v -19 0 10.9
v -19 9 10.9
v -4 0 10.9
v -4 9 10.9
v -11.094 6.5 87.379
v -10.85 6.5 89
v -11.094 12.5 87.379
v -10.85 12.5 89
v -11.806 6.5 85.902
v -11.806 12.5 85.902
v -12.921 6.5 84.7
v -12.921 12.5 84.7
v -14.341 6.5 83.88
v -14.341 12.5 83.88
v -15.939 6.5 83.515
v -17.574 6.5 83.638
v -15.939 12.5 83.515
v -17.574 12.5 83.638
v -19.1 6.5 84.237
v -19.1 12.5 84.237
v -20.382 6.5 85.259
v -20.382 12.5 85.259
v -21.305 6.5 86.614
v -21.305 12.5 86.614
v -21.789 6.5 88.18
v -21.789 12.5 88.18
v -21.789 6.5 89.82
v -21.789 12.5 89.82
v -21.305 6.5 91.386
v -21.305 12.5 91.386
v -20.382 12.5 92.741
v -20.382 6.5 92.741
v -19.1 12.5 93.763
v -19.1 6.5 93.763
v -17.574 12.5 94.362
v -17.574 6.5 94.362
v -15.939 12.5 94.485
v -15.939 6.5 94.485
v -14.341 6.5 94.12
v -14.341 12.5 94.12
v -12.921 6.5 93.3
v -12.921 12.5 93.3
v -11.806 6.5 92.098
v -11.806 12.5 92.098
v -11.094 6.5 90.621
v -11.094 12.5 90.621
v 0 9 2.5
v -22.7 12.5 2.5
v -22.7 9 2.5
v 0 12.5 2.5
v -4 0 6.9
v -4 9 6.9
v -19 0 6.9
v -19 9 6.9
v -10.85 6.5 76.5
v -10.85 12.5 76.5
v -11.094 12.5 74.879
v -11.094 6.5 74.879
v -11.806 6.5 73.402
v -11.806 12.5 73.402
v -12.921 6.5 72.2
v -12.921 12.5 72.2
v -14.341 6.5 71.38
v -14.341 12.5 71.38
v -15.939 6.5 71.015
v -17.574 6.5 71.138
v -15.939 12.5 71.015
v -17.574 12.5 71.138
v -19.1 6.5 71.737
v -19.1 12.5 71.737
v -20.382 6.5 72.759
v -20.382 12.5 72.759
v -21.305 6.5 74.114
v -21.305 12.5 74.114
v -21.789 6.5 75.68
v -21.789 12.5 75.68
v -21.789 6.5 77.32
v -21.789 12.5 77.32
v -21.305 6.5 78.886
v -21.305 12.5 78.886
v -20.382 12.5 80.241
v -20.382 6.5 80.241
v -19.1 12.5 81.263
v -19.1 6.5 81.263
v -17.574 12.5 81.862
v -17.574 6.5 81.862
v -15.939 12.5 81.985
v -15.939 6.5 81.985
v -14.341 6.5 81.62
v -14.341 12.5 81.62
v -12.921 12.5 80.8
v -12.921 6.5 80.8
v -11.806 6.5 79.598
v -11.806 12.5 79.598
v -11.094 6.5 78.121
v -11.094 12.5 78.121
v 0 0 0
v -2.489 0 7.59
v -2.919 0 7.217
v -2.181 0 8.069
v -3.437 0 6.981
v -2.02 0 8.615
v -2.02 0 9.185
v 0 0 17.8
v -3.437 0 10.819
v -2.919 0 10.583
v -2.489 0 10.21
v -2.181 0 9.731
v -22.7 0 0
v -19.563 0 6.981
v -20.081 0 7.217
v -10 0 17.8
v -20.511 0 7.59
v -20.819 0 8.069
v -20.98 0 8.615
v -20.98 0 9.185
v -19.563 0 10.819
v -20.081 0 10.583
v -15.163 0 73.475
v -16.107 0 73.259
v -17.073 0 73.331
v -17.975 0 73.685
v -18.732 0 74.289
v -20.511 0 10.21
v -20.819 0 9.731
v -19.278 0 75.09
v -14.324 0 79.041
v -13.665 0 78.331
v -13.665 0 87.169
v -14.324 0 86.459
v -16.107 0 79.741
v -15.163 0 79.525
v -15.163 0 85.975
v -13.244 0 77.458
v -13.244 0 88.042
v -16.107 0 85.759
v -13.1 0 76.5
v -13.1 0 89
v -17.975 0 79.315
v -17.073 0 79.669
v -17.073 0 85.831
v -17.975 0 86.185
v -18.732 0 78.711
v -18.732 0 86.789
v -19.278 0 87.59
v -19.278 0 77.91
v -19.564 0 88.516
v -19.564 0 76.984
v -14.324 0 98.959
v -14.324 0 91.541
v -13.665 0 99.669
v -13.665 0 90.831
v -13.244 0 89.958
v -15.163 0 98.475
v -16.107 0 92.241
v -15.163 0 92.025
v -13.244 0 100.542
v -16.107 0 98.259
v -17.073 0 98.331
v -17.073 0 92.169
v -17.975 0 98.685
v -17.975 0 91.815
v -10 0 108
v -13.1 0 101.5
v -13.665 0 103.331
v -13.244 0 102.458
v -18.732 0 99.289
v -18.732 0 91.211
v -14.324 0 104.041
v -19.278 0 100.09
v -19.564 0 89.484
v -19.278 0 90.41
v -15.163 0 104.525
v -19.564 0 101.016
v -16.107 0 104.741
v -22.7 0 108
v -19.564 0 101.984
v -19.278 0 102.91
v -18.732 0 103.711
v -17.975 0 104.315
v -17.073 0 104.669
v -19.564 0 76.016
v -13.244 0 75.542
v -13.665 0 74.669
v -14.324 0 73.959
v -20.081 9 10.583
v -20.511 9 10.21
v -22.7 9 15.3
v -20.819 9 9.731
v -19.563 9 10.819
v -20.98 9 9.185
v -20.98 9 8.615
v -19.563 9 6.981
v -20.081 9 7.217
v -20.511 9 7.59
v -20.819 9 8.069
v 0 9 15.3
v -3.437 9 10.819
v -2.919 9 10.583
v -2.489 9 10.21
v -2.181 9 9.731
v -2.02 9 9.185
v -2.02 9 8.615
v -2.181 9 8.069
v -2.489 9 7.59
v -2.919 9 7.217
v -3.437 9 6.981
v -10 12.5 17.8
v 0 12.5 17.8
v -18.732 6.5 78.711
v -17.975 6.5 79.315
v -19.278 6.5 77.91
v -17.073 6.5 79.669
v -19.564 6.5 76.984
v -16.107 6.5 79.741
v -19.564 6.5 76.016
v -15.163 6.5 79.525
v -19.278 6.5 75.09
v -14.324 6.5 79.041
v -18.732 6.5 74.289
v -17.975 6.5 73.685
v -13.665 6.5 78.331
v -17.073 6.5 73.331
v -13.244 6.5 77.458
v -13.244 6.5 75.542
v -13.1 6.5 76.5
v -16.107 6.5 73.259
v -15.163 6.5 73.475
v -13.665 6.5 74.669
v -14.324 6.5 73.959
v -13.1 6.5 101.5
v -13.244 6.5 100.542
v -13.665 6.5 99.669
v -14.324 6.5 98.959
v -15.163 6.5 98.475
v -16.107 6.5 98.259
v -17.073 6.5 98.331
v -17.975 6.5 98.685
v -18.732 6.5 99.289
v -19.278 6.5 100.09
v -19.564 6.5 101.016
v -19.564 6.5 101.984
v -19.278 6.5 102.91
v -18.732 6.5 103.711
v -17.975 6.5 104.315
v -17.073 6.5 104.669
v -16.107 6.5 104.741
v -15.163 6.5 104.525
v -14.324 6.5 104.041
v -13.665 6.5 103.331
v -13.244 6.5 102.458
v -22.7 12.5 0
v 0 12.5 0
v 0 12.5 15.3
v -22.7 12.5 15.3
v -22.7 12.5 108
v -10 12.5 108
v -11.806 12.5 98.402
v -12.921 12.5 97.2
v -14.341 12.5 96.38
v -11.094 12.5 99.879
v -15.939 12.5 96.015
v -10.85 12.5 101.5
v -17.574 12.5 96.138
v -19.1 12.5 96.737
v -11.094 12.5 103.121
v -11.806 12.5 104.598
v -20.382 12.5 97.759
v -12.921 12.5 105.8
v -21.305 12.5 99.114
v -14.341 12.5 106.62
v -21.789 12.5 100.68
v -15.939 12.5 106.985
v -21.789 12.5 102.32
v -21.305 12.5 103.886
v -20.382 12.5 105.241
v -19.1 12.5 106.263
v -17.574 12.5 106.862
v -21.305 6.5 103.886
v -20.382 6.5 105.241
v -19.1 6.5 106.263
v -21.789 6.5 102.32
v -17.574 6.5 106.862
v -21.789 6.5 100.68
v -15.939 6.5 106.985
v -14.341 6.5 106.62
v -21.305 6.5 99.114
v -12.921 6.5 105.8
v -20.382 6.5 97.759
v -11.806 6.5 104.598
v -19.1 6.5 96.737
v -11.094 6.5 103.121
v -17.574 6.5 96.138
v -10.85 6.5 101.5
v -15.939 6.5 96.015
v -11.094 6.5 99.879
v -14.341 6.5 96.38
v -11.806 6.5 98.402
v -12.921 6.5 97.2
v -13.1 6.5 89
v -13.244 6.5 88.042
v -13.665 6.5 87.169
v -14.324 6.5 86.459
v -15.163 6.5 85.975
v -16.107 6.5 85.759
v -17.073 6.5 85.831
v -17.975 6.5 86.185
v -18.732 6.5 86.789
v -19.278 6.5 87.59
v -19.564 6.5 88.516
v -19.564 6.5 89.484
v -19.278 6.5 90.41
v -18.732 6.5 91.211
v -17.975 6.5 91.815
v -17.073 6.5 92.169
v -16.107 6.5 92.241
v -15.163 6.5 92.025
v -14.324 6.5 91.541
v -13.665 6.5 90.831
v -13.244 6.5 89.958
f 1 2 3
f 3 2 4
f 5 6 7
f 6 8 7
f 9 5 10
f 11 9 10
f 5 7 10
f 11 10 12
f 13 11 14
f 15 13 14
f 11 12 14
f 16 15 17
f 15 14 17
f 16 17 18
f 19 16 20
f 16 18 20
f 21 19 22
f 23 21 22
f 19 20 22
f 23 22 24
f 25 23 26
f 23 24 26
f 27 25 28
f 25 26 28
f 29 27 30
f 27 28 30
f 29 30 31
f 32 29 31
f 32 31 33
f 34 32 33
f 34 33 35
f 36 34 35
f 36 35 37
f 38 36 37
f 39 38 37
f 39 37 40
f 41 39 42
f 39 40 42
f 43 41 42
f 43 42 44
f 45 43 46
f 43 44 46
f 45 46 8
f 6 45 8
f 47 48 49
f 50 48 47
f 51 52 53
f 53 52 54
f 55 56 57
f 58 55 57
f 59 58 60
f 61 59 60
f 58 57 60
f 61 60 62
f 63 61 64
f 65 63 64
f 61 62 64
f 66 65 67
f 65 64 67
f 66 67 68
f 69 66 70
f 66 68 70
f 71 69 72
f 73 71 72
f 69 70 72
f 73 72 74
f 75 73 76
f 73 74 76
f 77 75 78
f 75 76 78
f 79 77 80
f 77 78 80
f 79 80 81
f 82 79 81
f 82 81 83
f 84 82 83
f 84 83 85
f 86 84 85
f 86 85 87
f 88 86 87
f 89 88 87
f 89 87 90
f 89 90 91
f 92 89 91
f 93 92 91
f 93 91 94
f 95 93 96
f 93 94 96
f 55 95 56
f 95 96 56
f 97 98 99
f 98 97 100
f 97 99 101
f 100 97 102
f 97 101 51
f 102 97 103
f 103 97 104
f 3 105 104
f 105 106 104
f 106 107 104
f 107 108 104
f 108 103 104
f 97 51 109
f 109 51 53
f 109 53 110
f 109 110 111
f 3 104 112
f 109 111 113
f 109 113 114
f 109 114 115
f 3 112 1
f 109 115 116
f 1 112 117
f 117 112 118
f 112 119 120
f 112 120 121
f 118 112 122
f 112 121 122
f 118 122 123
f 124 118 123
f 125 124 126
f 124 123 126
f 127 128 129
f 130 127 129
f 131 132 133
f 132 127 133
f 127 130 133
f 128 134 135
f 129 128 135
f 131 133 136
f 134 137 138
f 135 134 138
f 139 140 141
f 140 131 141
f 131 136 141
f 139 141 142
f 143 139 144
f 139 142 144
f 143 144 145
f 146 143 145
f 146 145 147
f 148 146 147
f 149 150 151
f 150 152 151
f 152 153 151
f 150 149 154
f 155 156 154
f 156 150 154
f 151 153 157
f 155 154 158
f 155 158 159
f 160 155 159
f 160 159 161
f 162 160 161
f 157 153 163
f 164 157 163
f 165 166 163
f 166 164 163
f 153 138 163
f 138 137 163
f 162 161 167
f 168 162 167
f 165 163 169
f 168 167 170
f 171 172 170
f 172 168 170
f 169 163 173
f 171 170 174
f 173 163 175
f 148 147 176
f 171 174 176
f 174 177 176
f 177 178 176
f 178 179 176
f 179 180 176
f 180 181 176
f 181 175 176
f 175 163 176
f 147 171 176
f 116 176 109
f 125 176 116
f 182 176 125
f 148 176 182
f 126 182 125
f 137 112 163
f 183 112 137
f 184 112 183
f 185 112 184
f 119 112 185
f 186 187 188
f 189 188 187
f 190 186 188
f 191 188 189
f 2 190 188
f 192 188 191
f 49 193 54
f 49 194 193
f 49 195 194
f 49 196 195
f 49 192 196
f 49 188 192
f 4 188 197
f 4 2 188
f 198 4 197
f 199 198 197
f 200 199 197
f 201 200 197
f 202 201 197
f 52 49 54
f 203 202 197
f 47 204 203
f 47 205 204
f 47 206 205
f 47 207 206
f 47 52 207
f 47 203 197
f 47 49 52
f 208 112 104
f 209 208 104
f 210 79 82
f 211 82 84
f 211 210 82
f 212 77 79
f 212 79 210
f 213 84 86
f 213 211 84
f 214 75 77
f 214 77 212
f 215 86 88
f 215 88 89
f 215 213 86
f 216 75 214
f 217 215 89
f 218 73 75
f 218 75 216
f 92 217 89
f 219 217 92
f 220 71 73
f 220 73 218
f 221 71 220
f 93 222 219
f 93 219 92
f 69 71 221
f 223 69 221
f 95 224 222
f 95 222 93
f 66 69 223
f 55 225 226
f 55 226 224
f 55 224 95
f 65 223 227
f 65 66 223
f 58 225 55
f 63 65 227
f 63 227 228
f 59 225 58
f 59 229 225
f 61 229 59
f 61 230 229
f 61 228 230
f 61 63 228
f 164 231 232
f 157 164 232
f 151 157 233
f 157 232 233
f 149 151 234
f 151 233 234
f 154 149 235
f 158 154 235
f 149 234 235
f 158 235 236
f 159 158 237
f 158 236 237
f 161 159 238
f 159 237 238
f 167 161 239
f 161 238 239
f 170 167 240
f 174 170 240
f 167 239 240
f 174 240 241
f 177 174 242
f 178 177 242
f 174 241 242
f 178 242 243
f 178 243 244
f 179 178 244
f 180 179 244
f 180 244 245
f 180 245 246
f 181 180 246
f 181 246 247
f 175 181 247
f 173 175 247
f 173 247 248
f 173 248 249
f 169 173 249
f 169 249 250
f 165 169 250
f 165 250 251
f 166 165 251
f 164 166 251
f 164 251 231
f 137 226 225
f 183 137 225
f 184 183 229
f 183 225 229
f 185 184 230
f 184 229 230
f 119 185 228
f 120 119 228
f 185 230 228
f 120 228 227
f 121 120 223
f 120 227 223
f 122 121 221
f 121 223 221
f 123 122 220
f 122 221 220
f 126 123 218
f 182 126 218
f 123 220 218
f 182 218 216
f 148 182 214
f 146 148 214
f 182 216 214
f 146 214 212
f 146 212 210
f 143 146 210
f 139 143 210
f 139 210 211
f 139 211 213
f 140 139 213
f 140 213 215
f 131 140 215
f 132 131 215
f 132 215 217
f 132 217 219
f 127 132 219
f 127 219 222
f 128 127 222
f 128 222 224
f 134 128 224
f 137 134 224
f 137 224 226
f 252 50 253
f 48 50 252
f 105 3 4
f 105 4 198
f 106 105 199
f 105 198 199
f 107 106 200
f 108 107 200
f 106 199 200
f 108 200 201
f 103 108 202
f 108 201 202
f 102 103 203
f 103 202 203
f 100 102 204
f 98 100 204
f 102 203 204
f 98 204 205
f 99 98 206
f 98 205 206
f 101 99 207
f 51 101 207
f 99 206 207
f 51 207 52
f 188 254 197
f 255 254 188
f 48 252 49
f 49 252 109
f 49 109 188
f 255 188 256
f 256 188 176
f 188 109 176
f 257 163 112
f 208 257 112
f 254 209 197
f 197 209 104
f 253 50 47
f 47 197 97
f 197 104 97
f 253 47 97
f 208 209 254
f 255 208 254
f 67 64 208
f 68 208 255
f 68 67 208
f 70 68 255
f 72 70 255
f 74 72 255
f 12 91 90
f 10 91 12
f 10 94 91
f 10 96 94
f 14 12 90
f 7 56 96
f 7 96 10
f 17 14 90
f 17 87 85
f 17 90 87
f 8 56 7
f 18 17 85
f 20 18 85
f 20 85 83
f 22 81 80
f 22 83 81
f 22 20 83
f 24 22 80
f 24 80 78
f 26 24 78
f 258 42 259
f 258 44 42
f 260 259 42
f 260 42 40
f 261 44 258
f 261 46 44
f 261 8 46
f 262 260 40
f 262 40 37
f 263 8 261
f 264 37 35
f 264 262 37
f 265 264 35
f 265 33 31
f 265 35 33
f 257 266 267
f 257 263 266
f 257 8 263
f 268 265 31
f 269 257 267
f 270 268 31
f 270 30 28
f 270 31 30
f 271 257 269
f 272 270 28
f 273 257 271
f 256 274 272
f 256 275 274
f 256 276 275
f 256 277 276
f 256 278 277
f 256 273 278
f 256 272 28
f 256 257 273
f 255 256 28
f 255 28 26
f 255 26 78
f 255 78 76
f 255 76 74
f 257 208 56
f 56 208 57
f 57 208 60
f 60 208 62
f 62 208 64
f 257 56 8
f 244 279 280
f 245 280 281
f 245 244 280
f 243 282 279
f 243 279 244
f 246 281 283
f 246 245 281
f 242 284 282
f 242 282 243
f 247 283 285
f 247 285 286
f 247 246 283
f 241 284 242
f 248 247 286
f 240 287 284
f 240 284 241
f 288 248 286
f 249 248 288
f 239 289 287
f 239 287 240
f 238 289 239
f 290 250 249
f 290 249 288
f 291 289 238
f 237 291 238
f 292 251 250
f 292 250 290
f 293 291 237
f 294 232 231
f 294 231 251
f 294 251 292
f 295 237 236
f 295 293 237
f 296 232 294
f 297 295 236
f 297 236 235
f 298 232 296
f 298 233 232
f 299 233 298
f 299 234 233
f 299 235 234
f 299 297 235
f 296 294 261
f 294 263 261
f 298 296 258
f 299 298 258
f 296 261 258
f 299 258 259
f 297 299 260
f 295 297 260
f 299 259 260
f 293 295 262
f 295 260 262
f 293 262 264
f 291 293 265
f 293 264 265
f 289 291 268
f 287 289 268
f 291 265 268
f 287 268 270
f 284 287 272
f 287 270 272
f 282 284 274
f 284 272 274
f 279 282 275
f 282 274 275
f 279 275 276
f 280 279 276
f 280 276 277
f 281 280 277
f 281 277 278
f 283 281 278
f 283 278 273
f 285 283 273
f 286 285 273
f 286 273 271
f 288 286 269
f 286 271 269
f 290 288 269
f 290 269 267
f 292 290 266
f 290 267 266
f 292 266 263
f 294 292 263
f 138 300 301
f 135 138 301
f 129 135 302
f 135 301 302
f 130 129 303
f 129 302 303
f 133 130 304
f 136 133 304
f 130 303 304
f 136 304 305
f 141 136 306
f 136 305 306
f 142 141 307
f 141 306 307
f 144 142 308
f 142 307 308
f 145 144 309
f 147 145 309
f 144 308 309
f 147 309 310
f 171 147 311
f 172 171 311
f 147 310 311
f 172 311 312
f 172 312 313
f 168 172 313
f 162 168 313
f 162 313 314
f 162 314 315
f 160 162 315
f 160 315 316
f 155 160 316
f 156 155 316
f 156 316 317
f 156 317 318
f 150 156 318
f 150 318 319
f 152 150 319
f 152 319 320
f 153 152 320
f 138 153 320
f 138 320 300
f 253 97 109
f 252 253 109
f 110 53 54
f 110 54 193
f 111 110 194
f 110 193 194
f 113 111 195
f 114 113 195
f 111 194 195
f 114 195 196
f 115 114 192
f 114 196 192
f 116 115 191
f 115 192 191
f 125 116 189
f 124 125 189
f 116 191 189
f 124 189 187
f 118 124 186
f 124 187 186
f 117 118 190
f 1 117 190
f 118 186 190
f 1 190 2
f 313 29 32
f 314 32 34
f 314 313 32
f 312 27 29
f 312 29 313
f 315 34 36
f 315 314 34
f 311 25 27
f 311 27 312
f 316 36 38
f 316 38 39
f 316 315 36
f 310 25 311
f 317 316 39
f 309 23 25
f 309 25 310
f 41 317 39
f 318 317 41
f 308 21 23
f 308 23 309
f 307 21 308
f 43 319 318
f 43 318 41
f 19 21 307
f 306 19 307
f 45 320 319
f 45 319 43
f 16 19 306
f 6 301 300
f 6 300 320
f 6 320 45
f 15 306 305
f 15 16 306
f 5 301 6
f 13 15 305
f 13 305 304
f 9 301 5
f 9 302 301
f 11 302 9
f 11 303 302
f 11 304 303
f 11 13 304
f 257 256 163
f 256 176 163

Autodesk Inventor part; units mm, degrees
ref_plane "YZ Plane" through (0, 0, 0) normal (1, 0, 0) x (0, 1, 0)
ref_plane "XZ Plane" through (0, 0, 0) normal (0, 1, 0) x (-1, 0, 0)
ref_plane "XY Plane" through (0, 0, 0) normal (0, 0, 1) x (1, 0, 0)
sketch "Sketch1" plane through (0, 0, 0) normal (0, 1, 0) x (-1, 0, 0)
  line L0 (0, 0) -> (22.7, 0)
  line L1 (22.7, 0) -> (22.7, 108)
  line L2 (22.7, 108) -> (10, 108)
  line L3 (10, 108) -> (10, 17.8)
  line L4 (10, 17.8) -> (0, 17.8)
  line L5 (0, 17.8) -> (0, 0)
  dimension "d0" = 22.7
  dimension "d1" = 108
  dimension "d2" = 12.7
  dimension "d3" = 90.2
extrude "Extrusion1" add sketch "Sketch1" along normal blind 12.5
sketch "Sketch2" plane through (0, 12.5, 0) normal (0, 1, 0) x (1, 0, 0)
  line L0 (0, -17.8) -> (0, 0) projected
  line L1 (-22.7, 0) -> (-22.7, -108) projected
  line L2 (-22.7, 0) -> (-22.7, -108) projected
  line L3 (0, -15.3) -> (-22.7, -15.3)
  line L4 (-22.7, -15.3) -> (-22.7, -2.5)
  line L5 (-22.7, -2.5) -> (0, -2.5)
  line L6 (0, -2.5) -> (0, -15.3)
  dimension "d6" = 12.8
extrude "Extrusion2" cut sketch "Sketch2" against normal blind 3.5
sketch "Sketch3" plane through (0, 9, 0) normal (0, 1, 0) x (1, 0, 0)
  line L0 (-30, -8.9) -> (0, -8.9) construction
  line L1 (0, -17.8) -> (0, 0) projected
  arc A0 (-4, -10.9) -> (-4, -6.9) centre (-4, -8.9) ccw
  arc A1 (-19, -6.9) -> (-19, -10.9) centre (-19, -8.9) ccw
  line L2 (-19, -10.9) -> (-4, -10.9)
  line L3 (-4, -6.9) -> (-19, -6.9)
  dimension "d9" = 4
  dimension "d10" = 4
  dimension "d26" = 15
  dimension "d27" = 4
extrude "Extrusion3" cut sketch "Sketch3" against normal through all
sketch "Sketch4" plane through (0, 12.5, 0) normal (0, 1, 0) x (1, 0, 0)
  line L0 (-22.7, -108) -> (-10, -108) projected
  line L1 (-16.35, -108) -> (-16.35, -15.5103) construction
  circle A0 centre (-16.35, -101.5) radius 5.5
  circle A1 centre (-16.35, -89) radius 5.5
  circle A2 centre (-16.35, -76.5) radius 5.5
  circle A3 centre (-16.35, -76.5) radius 3.25
  circle A4 centre (-16.35, -89) radius 3.25
  circle A5 centre (-16.35, -101.5) radius 3.25
  point P0 (0, 0)
  dimension "d13" = 11
  dimension "d14" = 11
  dimension "d15" = 11
  dimension "d16" = 12.5
  dimension "d17" = 12.5
  dimension "d18" = 6.5
  dimension "d19" = 6.5
  dimension "d20" = 6.5
  dimension "d25" = 6.5
extrude "Extrusion4" cut sketch "Sketch4" against normal through all contours A3 | A4 | A5
extrude "Extrusion5" cut sketch "Sketch4" against normal blind 6
properties part number "HeadbarHolder" material "Aluminum 6061"
